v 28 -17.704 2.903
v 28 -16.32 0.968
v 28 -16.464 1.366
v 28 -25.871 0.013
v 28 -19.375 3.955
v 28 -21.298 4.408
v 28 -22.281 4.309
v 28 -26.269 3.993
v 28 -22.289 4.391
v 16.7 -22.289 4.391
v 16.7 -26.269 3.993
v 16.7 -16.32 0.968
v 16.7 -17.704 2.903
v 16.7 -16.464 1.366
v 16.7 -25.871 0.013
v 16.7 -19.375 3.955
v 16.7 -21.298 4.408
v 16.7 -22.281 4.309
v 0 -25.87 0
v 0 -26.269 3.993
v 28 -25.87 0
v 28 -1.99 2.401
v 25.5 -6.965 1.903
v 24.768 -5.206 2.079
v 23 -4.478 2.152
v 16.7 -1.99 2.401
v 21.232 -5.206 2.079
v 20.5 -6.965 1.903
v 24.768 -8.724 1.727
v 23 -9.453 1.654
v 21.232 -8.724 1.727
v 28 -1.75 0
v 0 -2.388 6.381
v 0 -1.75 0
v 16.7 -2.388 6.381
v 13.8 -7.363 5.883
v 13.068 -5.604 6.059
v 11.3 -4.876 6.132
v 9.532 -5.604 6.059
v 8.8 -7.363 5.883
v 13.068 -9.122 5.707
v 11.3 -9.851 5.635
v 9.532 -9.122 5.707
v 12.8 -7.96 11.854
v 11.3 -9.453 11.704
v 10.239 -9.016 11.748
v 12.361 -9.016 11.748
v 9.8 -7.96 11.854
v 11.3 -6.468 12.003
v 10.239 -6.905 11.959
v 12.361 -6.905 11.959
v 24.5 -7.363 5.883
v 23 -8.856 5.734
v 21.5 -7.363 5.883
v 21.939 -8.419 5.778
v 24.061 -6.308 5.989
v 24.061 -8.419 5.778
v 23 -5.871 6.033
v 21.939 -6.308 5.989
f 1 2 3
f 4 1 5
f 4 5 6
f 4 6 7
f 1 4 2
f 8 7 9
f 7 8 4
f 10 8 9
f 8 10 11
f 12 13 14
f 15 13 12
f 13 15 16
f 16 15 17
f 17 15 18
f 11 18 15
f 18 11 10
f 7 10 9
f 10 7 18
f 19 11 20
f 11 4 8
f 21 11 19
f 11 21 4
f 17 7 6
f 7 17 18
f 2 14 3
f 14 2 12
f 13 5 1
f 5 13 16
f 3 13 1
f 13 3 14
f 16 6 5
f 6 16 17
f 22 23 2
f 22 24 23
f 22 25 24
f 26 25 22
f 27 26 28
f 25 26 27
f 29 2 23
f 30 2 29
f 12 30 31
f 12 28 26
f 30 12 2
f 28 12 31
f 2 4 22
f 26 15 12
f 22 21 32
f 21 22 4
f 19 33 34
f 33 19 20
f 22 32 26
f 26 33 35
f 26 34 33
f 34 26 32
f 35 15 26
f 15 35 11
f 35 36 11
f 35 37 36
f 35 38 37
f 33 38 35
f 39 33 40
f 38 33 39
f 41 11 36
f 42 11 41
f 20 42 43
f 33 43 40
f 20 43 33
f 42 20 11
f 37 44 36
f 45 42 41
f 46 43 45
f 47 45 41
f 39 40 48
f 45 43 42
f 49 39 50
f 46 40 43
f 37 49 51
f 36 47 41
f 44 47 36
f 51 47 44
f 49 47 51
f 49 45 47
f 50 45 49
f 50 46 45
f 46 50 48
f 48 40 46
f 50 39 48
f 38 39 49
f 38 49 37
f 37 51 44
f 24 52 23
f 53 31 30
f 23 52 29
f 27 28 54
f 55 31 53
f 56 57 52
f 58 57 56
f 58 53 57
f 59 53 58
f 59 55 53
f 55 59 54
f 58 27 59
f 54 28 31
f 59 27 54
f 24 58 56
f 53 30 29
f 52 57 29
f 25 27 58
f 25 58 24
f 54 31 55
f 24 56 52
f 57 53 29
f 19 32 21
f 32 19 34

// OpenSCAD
//variables
//main block
	bw = 28;
	bl = 24;
	bh = 20;
//small block
	sbw = bw - 11.3;
	sbl = bl;
	sbh = 4;
//hole infos
	rbase = 5/2;
	rtop = 3/2;
	hinset = 5;
	h1x = 11.3;
	h2x = 23;
	h1z = 6;
	h2z = 4;
//extra triangle-esque piece
	tr = 6;
	tl = 4;
	txl = 10;
module tspacer(){
	intersection(){
		cube([bw-sbw,txl,sbh]);
		union(){
			cube([bw-sbw,tl,sbh]);
			translate([0,tr/2+1,-2]) rotate([0,90,0]) cylinder(r=tr,h=bw-sbw);
		}
	}
}

//rotate whole thing and subtract ground
	xtheta = atan(bh/200);

//main
difference(){
//remove translate from next line to print at full size
	translate([0,0,-17.5]) rotate([xtheta,0,0]){
		translate([0,-bl,0]) union(){
			//main block
			cube([bw,bl,bh]);
			//small block
			translate([0,0,bh]) cube([sbw,sbl,sbh]);
			//hole 1
			translate([h1x,bl-hinset,bh+sbh]) cylinder(r1 = rbase,r2=rtop,h=h1z);
			//hole 2
			translate([h2x,bl-hinset,bh]) cylinder(r1 = rbase,r2=rtop,h=h2z);
			//semi-trangular spacer
			translate([sbw,0,bh]) tspacer();
		}
	}
	color("red") translate([0,-bl*2,-bh]) cube([bw,bl*2,bh]);
}
